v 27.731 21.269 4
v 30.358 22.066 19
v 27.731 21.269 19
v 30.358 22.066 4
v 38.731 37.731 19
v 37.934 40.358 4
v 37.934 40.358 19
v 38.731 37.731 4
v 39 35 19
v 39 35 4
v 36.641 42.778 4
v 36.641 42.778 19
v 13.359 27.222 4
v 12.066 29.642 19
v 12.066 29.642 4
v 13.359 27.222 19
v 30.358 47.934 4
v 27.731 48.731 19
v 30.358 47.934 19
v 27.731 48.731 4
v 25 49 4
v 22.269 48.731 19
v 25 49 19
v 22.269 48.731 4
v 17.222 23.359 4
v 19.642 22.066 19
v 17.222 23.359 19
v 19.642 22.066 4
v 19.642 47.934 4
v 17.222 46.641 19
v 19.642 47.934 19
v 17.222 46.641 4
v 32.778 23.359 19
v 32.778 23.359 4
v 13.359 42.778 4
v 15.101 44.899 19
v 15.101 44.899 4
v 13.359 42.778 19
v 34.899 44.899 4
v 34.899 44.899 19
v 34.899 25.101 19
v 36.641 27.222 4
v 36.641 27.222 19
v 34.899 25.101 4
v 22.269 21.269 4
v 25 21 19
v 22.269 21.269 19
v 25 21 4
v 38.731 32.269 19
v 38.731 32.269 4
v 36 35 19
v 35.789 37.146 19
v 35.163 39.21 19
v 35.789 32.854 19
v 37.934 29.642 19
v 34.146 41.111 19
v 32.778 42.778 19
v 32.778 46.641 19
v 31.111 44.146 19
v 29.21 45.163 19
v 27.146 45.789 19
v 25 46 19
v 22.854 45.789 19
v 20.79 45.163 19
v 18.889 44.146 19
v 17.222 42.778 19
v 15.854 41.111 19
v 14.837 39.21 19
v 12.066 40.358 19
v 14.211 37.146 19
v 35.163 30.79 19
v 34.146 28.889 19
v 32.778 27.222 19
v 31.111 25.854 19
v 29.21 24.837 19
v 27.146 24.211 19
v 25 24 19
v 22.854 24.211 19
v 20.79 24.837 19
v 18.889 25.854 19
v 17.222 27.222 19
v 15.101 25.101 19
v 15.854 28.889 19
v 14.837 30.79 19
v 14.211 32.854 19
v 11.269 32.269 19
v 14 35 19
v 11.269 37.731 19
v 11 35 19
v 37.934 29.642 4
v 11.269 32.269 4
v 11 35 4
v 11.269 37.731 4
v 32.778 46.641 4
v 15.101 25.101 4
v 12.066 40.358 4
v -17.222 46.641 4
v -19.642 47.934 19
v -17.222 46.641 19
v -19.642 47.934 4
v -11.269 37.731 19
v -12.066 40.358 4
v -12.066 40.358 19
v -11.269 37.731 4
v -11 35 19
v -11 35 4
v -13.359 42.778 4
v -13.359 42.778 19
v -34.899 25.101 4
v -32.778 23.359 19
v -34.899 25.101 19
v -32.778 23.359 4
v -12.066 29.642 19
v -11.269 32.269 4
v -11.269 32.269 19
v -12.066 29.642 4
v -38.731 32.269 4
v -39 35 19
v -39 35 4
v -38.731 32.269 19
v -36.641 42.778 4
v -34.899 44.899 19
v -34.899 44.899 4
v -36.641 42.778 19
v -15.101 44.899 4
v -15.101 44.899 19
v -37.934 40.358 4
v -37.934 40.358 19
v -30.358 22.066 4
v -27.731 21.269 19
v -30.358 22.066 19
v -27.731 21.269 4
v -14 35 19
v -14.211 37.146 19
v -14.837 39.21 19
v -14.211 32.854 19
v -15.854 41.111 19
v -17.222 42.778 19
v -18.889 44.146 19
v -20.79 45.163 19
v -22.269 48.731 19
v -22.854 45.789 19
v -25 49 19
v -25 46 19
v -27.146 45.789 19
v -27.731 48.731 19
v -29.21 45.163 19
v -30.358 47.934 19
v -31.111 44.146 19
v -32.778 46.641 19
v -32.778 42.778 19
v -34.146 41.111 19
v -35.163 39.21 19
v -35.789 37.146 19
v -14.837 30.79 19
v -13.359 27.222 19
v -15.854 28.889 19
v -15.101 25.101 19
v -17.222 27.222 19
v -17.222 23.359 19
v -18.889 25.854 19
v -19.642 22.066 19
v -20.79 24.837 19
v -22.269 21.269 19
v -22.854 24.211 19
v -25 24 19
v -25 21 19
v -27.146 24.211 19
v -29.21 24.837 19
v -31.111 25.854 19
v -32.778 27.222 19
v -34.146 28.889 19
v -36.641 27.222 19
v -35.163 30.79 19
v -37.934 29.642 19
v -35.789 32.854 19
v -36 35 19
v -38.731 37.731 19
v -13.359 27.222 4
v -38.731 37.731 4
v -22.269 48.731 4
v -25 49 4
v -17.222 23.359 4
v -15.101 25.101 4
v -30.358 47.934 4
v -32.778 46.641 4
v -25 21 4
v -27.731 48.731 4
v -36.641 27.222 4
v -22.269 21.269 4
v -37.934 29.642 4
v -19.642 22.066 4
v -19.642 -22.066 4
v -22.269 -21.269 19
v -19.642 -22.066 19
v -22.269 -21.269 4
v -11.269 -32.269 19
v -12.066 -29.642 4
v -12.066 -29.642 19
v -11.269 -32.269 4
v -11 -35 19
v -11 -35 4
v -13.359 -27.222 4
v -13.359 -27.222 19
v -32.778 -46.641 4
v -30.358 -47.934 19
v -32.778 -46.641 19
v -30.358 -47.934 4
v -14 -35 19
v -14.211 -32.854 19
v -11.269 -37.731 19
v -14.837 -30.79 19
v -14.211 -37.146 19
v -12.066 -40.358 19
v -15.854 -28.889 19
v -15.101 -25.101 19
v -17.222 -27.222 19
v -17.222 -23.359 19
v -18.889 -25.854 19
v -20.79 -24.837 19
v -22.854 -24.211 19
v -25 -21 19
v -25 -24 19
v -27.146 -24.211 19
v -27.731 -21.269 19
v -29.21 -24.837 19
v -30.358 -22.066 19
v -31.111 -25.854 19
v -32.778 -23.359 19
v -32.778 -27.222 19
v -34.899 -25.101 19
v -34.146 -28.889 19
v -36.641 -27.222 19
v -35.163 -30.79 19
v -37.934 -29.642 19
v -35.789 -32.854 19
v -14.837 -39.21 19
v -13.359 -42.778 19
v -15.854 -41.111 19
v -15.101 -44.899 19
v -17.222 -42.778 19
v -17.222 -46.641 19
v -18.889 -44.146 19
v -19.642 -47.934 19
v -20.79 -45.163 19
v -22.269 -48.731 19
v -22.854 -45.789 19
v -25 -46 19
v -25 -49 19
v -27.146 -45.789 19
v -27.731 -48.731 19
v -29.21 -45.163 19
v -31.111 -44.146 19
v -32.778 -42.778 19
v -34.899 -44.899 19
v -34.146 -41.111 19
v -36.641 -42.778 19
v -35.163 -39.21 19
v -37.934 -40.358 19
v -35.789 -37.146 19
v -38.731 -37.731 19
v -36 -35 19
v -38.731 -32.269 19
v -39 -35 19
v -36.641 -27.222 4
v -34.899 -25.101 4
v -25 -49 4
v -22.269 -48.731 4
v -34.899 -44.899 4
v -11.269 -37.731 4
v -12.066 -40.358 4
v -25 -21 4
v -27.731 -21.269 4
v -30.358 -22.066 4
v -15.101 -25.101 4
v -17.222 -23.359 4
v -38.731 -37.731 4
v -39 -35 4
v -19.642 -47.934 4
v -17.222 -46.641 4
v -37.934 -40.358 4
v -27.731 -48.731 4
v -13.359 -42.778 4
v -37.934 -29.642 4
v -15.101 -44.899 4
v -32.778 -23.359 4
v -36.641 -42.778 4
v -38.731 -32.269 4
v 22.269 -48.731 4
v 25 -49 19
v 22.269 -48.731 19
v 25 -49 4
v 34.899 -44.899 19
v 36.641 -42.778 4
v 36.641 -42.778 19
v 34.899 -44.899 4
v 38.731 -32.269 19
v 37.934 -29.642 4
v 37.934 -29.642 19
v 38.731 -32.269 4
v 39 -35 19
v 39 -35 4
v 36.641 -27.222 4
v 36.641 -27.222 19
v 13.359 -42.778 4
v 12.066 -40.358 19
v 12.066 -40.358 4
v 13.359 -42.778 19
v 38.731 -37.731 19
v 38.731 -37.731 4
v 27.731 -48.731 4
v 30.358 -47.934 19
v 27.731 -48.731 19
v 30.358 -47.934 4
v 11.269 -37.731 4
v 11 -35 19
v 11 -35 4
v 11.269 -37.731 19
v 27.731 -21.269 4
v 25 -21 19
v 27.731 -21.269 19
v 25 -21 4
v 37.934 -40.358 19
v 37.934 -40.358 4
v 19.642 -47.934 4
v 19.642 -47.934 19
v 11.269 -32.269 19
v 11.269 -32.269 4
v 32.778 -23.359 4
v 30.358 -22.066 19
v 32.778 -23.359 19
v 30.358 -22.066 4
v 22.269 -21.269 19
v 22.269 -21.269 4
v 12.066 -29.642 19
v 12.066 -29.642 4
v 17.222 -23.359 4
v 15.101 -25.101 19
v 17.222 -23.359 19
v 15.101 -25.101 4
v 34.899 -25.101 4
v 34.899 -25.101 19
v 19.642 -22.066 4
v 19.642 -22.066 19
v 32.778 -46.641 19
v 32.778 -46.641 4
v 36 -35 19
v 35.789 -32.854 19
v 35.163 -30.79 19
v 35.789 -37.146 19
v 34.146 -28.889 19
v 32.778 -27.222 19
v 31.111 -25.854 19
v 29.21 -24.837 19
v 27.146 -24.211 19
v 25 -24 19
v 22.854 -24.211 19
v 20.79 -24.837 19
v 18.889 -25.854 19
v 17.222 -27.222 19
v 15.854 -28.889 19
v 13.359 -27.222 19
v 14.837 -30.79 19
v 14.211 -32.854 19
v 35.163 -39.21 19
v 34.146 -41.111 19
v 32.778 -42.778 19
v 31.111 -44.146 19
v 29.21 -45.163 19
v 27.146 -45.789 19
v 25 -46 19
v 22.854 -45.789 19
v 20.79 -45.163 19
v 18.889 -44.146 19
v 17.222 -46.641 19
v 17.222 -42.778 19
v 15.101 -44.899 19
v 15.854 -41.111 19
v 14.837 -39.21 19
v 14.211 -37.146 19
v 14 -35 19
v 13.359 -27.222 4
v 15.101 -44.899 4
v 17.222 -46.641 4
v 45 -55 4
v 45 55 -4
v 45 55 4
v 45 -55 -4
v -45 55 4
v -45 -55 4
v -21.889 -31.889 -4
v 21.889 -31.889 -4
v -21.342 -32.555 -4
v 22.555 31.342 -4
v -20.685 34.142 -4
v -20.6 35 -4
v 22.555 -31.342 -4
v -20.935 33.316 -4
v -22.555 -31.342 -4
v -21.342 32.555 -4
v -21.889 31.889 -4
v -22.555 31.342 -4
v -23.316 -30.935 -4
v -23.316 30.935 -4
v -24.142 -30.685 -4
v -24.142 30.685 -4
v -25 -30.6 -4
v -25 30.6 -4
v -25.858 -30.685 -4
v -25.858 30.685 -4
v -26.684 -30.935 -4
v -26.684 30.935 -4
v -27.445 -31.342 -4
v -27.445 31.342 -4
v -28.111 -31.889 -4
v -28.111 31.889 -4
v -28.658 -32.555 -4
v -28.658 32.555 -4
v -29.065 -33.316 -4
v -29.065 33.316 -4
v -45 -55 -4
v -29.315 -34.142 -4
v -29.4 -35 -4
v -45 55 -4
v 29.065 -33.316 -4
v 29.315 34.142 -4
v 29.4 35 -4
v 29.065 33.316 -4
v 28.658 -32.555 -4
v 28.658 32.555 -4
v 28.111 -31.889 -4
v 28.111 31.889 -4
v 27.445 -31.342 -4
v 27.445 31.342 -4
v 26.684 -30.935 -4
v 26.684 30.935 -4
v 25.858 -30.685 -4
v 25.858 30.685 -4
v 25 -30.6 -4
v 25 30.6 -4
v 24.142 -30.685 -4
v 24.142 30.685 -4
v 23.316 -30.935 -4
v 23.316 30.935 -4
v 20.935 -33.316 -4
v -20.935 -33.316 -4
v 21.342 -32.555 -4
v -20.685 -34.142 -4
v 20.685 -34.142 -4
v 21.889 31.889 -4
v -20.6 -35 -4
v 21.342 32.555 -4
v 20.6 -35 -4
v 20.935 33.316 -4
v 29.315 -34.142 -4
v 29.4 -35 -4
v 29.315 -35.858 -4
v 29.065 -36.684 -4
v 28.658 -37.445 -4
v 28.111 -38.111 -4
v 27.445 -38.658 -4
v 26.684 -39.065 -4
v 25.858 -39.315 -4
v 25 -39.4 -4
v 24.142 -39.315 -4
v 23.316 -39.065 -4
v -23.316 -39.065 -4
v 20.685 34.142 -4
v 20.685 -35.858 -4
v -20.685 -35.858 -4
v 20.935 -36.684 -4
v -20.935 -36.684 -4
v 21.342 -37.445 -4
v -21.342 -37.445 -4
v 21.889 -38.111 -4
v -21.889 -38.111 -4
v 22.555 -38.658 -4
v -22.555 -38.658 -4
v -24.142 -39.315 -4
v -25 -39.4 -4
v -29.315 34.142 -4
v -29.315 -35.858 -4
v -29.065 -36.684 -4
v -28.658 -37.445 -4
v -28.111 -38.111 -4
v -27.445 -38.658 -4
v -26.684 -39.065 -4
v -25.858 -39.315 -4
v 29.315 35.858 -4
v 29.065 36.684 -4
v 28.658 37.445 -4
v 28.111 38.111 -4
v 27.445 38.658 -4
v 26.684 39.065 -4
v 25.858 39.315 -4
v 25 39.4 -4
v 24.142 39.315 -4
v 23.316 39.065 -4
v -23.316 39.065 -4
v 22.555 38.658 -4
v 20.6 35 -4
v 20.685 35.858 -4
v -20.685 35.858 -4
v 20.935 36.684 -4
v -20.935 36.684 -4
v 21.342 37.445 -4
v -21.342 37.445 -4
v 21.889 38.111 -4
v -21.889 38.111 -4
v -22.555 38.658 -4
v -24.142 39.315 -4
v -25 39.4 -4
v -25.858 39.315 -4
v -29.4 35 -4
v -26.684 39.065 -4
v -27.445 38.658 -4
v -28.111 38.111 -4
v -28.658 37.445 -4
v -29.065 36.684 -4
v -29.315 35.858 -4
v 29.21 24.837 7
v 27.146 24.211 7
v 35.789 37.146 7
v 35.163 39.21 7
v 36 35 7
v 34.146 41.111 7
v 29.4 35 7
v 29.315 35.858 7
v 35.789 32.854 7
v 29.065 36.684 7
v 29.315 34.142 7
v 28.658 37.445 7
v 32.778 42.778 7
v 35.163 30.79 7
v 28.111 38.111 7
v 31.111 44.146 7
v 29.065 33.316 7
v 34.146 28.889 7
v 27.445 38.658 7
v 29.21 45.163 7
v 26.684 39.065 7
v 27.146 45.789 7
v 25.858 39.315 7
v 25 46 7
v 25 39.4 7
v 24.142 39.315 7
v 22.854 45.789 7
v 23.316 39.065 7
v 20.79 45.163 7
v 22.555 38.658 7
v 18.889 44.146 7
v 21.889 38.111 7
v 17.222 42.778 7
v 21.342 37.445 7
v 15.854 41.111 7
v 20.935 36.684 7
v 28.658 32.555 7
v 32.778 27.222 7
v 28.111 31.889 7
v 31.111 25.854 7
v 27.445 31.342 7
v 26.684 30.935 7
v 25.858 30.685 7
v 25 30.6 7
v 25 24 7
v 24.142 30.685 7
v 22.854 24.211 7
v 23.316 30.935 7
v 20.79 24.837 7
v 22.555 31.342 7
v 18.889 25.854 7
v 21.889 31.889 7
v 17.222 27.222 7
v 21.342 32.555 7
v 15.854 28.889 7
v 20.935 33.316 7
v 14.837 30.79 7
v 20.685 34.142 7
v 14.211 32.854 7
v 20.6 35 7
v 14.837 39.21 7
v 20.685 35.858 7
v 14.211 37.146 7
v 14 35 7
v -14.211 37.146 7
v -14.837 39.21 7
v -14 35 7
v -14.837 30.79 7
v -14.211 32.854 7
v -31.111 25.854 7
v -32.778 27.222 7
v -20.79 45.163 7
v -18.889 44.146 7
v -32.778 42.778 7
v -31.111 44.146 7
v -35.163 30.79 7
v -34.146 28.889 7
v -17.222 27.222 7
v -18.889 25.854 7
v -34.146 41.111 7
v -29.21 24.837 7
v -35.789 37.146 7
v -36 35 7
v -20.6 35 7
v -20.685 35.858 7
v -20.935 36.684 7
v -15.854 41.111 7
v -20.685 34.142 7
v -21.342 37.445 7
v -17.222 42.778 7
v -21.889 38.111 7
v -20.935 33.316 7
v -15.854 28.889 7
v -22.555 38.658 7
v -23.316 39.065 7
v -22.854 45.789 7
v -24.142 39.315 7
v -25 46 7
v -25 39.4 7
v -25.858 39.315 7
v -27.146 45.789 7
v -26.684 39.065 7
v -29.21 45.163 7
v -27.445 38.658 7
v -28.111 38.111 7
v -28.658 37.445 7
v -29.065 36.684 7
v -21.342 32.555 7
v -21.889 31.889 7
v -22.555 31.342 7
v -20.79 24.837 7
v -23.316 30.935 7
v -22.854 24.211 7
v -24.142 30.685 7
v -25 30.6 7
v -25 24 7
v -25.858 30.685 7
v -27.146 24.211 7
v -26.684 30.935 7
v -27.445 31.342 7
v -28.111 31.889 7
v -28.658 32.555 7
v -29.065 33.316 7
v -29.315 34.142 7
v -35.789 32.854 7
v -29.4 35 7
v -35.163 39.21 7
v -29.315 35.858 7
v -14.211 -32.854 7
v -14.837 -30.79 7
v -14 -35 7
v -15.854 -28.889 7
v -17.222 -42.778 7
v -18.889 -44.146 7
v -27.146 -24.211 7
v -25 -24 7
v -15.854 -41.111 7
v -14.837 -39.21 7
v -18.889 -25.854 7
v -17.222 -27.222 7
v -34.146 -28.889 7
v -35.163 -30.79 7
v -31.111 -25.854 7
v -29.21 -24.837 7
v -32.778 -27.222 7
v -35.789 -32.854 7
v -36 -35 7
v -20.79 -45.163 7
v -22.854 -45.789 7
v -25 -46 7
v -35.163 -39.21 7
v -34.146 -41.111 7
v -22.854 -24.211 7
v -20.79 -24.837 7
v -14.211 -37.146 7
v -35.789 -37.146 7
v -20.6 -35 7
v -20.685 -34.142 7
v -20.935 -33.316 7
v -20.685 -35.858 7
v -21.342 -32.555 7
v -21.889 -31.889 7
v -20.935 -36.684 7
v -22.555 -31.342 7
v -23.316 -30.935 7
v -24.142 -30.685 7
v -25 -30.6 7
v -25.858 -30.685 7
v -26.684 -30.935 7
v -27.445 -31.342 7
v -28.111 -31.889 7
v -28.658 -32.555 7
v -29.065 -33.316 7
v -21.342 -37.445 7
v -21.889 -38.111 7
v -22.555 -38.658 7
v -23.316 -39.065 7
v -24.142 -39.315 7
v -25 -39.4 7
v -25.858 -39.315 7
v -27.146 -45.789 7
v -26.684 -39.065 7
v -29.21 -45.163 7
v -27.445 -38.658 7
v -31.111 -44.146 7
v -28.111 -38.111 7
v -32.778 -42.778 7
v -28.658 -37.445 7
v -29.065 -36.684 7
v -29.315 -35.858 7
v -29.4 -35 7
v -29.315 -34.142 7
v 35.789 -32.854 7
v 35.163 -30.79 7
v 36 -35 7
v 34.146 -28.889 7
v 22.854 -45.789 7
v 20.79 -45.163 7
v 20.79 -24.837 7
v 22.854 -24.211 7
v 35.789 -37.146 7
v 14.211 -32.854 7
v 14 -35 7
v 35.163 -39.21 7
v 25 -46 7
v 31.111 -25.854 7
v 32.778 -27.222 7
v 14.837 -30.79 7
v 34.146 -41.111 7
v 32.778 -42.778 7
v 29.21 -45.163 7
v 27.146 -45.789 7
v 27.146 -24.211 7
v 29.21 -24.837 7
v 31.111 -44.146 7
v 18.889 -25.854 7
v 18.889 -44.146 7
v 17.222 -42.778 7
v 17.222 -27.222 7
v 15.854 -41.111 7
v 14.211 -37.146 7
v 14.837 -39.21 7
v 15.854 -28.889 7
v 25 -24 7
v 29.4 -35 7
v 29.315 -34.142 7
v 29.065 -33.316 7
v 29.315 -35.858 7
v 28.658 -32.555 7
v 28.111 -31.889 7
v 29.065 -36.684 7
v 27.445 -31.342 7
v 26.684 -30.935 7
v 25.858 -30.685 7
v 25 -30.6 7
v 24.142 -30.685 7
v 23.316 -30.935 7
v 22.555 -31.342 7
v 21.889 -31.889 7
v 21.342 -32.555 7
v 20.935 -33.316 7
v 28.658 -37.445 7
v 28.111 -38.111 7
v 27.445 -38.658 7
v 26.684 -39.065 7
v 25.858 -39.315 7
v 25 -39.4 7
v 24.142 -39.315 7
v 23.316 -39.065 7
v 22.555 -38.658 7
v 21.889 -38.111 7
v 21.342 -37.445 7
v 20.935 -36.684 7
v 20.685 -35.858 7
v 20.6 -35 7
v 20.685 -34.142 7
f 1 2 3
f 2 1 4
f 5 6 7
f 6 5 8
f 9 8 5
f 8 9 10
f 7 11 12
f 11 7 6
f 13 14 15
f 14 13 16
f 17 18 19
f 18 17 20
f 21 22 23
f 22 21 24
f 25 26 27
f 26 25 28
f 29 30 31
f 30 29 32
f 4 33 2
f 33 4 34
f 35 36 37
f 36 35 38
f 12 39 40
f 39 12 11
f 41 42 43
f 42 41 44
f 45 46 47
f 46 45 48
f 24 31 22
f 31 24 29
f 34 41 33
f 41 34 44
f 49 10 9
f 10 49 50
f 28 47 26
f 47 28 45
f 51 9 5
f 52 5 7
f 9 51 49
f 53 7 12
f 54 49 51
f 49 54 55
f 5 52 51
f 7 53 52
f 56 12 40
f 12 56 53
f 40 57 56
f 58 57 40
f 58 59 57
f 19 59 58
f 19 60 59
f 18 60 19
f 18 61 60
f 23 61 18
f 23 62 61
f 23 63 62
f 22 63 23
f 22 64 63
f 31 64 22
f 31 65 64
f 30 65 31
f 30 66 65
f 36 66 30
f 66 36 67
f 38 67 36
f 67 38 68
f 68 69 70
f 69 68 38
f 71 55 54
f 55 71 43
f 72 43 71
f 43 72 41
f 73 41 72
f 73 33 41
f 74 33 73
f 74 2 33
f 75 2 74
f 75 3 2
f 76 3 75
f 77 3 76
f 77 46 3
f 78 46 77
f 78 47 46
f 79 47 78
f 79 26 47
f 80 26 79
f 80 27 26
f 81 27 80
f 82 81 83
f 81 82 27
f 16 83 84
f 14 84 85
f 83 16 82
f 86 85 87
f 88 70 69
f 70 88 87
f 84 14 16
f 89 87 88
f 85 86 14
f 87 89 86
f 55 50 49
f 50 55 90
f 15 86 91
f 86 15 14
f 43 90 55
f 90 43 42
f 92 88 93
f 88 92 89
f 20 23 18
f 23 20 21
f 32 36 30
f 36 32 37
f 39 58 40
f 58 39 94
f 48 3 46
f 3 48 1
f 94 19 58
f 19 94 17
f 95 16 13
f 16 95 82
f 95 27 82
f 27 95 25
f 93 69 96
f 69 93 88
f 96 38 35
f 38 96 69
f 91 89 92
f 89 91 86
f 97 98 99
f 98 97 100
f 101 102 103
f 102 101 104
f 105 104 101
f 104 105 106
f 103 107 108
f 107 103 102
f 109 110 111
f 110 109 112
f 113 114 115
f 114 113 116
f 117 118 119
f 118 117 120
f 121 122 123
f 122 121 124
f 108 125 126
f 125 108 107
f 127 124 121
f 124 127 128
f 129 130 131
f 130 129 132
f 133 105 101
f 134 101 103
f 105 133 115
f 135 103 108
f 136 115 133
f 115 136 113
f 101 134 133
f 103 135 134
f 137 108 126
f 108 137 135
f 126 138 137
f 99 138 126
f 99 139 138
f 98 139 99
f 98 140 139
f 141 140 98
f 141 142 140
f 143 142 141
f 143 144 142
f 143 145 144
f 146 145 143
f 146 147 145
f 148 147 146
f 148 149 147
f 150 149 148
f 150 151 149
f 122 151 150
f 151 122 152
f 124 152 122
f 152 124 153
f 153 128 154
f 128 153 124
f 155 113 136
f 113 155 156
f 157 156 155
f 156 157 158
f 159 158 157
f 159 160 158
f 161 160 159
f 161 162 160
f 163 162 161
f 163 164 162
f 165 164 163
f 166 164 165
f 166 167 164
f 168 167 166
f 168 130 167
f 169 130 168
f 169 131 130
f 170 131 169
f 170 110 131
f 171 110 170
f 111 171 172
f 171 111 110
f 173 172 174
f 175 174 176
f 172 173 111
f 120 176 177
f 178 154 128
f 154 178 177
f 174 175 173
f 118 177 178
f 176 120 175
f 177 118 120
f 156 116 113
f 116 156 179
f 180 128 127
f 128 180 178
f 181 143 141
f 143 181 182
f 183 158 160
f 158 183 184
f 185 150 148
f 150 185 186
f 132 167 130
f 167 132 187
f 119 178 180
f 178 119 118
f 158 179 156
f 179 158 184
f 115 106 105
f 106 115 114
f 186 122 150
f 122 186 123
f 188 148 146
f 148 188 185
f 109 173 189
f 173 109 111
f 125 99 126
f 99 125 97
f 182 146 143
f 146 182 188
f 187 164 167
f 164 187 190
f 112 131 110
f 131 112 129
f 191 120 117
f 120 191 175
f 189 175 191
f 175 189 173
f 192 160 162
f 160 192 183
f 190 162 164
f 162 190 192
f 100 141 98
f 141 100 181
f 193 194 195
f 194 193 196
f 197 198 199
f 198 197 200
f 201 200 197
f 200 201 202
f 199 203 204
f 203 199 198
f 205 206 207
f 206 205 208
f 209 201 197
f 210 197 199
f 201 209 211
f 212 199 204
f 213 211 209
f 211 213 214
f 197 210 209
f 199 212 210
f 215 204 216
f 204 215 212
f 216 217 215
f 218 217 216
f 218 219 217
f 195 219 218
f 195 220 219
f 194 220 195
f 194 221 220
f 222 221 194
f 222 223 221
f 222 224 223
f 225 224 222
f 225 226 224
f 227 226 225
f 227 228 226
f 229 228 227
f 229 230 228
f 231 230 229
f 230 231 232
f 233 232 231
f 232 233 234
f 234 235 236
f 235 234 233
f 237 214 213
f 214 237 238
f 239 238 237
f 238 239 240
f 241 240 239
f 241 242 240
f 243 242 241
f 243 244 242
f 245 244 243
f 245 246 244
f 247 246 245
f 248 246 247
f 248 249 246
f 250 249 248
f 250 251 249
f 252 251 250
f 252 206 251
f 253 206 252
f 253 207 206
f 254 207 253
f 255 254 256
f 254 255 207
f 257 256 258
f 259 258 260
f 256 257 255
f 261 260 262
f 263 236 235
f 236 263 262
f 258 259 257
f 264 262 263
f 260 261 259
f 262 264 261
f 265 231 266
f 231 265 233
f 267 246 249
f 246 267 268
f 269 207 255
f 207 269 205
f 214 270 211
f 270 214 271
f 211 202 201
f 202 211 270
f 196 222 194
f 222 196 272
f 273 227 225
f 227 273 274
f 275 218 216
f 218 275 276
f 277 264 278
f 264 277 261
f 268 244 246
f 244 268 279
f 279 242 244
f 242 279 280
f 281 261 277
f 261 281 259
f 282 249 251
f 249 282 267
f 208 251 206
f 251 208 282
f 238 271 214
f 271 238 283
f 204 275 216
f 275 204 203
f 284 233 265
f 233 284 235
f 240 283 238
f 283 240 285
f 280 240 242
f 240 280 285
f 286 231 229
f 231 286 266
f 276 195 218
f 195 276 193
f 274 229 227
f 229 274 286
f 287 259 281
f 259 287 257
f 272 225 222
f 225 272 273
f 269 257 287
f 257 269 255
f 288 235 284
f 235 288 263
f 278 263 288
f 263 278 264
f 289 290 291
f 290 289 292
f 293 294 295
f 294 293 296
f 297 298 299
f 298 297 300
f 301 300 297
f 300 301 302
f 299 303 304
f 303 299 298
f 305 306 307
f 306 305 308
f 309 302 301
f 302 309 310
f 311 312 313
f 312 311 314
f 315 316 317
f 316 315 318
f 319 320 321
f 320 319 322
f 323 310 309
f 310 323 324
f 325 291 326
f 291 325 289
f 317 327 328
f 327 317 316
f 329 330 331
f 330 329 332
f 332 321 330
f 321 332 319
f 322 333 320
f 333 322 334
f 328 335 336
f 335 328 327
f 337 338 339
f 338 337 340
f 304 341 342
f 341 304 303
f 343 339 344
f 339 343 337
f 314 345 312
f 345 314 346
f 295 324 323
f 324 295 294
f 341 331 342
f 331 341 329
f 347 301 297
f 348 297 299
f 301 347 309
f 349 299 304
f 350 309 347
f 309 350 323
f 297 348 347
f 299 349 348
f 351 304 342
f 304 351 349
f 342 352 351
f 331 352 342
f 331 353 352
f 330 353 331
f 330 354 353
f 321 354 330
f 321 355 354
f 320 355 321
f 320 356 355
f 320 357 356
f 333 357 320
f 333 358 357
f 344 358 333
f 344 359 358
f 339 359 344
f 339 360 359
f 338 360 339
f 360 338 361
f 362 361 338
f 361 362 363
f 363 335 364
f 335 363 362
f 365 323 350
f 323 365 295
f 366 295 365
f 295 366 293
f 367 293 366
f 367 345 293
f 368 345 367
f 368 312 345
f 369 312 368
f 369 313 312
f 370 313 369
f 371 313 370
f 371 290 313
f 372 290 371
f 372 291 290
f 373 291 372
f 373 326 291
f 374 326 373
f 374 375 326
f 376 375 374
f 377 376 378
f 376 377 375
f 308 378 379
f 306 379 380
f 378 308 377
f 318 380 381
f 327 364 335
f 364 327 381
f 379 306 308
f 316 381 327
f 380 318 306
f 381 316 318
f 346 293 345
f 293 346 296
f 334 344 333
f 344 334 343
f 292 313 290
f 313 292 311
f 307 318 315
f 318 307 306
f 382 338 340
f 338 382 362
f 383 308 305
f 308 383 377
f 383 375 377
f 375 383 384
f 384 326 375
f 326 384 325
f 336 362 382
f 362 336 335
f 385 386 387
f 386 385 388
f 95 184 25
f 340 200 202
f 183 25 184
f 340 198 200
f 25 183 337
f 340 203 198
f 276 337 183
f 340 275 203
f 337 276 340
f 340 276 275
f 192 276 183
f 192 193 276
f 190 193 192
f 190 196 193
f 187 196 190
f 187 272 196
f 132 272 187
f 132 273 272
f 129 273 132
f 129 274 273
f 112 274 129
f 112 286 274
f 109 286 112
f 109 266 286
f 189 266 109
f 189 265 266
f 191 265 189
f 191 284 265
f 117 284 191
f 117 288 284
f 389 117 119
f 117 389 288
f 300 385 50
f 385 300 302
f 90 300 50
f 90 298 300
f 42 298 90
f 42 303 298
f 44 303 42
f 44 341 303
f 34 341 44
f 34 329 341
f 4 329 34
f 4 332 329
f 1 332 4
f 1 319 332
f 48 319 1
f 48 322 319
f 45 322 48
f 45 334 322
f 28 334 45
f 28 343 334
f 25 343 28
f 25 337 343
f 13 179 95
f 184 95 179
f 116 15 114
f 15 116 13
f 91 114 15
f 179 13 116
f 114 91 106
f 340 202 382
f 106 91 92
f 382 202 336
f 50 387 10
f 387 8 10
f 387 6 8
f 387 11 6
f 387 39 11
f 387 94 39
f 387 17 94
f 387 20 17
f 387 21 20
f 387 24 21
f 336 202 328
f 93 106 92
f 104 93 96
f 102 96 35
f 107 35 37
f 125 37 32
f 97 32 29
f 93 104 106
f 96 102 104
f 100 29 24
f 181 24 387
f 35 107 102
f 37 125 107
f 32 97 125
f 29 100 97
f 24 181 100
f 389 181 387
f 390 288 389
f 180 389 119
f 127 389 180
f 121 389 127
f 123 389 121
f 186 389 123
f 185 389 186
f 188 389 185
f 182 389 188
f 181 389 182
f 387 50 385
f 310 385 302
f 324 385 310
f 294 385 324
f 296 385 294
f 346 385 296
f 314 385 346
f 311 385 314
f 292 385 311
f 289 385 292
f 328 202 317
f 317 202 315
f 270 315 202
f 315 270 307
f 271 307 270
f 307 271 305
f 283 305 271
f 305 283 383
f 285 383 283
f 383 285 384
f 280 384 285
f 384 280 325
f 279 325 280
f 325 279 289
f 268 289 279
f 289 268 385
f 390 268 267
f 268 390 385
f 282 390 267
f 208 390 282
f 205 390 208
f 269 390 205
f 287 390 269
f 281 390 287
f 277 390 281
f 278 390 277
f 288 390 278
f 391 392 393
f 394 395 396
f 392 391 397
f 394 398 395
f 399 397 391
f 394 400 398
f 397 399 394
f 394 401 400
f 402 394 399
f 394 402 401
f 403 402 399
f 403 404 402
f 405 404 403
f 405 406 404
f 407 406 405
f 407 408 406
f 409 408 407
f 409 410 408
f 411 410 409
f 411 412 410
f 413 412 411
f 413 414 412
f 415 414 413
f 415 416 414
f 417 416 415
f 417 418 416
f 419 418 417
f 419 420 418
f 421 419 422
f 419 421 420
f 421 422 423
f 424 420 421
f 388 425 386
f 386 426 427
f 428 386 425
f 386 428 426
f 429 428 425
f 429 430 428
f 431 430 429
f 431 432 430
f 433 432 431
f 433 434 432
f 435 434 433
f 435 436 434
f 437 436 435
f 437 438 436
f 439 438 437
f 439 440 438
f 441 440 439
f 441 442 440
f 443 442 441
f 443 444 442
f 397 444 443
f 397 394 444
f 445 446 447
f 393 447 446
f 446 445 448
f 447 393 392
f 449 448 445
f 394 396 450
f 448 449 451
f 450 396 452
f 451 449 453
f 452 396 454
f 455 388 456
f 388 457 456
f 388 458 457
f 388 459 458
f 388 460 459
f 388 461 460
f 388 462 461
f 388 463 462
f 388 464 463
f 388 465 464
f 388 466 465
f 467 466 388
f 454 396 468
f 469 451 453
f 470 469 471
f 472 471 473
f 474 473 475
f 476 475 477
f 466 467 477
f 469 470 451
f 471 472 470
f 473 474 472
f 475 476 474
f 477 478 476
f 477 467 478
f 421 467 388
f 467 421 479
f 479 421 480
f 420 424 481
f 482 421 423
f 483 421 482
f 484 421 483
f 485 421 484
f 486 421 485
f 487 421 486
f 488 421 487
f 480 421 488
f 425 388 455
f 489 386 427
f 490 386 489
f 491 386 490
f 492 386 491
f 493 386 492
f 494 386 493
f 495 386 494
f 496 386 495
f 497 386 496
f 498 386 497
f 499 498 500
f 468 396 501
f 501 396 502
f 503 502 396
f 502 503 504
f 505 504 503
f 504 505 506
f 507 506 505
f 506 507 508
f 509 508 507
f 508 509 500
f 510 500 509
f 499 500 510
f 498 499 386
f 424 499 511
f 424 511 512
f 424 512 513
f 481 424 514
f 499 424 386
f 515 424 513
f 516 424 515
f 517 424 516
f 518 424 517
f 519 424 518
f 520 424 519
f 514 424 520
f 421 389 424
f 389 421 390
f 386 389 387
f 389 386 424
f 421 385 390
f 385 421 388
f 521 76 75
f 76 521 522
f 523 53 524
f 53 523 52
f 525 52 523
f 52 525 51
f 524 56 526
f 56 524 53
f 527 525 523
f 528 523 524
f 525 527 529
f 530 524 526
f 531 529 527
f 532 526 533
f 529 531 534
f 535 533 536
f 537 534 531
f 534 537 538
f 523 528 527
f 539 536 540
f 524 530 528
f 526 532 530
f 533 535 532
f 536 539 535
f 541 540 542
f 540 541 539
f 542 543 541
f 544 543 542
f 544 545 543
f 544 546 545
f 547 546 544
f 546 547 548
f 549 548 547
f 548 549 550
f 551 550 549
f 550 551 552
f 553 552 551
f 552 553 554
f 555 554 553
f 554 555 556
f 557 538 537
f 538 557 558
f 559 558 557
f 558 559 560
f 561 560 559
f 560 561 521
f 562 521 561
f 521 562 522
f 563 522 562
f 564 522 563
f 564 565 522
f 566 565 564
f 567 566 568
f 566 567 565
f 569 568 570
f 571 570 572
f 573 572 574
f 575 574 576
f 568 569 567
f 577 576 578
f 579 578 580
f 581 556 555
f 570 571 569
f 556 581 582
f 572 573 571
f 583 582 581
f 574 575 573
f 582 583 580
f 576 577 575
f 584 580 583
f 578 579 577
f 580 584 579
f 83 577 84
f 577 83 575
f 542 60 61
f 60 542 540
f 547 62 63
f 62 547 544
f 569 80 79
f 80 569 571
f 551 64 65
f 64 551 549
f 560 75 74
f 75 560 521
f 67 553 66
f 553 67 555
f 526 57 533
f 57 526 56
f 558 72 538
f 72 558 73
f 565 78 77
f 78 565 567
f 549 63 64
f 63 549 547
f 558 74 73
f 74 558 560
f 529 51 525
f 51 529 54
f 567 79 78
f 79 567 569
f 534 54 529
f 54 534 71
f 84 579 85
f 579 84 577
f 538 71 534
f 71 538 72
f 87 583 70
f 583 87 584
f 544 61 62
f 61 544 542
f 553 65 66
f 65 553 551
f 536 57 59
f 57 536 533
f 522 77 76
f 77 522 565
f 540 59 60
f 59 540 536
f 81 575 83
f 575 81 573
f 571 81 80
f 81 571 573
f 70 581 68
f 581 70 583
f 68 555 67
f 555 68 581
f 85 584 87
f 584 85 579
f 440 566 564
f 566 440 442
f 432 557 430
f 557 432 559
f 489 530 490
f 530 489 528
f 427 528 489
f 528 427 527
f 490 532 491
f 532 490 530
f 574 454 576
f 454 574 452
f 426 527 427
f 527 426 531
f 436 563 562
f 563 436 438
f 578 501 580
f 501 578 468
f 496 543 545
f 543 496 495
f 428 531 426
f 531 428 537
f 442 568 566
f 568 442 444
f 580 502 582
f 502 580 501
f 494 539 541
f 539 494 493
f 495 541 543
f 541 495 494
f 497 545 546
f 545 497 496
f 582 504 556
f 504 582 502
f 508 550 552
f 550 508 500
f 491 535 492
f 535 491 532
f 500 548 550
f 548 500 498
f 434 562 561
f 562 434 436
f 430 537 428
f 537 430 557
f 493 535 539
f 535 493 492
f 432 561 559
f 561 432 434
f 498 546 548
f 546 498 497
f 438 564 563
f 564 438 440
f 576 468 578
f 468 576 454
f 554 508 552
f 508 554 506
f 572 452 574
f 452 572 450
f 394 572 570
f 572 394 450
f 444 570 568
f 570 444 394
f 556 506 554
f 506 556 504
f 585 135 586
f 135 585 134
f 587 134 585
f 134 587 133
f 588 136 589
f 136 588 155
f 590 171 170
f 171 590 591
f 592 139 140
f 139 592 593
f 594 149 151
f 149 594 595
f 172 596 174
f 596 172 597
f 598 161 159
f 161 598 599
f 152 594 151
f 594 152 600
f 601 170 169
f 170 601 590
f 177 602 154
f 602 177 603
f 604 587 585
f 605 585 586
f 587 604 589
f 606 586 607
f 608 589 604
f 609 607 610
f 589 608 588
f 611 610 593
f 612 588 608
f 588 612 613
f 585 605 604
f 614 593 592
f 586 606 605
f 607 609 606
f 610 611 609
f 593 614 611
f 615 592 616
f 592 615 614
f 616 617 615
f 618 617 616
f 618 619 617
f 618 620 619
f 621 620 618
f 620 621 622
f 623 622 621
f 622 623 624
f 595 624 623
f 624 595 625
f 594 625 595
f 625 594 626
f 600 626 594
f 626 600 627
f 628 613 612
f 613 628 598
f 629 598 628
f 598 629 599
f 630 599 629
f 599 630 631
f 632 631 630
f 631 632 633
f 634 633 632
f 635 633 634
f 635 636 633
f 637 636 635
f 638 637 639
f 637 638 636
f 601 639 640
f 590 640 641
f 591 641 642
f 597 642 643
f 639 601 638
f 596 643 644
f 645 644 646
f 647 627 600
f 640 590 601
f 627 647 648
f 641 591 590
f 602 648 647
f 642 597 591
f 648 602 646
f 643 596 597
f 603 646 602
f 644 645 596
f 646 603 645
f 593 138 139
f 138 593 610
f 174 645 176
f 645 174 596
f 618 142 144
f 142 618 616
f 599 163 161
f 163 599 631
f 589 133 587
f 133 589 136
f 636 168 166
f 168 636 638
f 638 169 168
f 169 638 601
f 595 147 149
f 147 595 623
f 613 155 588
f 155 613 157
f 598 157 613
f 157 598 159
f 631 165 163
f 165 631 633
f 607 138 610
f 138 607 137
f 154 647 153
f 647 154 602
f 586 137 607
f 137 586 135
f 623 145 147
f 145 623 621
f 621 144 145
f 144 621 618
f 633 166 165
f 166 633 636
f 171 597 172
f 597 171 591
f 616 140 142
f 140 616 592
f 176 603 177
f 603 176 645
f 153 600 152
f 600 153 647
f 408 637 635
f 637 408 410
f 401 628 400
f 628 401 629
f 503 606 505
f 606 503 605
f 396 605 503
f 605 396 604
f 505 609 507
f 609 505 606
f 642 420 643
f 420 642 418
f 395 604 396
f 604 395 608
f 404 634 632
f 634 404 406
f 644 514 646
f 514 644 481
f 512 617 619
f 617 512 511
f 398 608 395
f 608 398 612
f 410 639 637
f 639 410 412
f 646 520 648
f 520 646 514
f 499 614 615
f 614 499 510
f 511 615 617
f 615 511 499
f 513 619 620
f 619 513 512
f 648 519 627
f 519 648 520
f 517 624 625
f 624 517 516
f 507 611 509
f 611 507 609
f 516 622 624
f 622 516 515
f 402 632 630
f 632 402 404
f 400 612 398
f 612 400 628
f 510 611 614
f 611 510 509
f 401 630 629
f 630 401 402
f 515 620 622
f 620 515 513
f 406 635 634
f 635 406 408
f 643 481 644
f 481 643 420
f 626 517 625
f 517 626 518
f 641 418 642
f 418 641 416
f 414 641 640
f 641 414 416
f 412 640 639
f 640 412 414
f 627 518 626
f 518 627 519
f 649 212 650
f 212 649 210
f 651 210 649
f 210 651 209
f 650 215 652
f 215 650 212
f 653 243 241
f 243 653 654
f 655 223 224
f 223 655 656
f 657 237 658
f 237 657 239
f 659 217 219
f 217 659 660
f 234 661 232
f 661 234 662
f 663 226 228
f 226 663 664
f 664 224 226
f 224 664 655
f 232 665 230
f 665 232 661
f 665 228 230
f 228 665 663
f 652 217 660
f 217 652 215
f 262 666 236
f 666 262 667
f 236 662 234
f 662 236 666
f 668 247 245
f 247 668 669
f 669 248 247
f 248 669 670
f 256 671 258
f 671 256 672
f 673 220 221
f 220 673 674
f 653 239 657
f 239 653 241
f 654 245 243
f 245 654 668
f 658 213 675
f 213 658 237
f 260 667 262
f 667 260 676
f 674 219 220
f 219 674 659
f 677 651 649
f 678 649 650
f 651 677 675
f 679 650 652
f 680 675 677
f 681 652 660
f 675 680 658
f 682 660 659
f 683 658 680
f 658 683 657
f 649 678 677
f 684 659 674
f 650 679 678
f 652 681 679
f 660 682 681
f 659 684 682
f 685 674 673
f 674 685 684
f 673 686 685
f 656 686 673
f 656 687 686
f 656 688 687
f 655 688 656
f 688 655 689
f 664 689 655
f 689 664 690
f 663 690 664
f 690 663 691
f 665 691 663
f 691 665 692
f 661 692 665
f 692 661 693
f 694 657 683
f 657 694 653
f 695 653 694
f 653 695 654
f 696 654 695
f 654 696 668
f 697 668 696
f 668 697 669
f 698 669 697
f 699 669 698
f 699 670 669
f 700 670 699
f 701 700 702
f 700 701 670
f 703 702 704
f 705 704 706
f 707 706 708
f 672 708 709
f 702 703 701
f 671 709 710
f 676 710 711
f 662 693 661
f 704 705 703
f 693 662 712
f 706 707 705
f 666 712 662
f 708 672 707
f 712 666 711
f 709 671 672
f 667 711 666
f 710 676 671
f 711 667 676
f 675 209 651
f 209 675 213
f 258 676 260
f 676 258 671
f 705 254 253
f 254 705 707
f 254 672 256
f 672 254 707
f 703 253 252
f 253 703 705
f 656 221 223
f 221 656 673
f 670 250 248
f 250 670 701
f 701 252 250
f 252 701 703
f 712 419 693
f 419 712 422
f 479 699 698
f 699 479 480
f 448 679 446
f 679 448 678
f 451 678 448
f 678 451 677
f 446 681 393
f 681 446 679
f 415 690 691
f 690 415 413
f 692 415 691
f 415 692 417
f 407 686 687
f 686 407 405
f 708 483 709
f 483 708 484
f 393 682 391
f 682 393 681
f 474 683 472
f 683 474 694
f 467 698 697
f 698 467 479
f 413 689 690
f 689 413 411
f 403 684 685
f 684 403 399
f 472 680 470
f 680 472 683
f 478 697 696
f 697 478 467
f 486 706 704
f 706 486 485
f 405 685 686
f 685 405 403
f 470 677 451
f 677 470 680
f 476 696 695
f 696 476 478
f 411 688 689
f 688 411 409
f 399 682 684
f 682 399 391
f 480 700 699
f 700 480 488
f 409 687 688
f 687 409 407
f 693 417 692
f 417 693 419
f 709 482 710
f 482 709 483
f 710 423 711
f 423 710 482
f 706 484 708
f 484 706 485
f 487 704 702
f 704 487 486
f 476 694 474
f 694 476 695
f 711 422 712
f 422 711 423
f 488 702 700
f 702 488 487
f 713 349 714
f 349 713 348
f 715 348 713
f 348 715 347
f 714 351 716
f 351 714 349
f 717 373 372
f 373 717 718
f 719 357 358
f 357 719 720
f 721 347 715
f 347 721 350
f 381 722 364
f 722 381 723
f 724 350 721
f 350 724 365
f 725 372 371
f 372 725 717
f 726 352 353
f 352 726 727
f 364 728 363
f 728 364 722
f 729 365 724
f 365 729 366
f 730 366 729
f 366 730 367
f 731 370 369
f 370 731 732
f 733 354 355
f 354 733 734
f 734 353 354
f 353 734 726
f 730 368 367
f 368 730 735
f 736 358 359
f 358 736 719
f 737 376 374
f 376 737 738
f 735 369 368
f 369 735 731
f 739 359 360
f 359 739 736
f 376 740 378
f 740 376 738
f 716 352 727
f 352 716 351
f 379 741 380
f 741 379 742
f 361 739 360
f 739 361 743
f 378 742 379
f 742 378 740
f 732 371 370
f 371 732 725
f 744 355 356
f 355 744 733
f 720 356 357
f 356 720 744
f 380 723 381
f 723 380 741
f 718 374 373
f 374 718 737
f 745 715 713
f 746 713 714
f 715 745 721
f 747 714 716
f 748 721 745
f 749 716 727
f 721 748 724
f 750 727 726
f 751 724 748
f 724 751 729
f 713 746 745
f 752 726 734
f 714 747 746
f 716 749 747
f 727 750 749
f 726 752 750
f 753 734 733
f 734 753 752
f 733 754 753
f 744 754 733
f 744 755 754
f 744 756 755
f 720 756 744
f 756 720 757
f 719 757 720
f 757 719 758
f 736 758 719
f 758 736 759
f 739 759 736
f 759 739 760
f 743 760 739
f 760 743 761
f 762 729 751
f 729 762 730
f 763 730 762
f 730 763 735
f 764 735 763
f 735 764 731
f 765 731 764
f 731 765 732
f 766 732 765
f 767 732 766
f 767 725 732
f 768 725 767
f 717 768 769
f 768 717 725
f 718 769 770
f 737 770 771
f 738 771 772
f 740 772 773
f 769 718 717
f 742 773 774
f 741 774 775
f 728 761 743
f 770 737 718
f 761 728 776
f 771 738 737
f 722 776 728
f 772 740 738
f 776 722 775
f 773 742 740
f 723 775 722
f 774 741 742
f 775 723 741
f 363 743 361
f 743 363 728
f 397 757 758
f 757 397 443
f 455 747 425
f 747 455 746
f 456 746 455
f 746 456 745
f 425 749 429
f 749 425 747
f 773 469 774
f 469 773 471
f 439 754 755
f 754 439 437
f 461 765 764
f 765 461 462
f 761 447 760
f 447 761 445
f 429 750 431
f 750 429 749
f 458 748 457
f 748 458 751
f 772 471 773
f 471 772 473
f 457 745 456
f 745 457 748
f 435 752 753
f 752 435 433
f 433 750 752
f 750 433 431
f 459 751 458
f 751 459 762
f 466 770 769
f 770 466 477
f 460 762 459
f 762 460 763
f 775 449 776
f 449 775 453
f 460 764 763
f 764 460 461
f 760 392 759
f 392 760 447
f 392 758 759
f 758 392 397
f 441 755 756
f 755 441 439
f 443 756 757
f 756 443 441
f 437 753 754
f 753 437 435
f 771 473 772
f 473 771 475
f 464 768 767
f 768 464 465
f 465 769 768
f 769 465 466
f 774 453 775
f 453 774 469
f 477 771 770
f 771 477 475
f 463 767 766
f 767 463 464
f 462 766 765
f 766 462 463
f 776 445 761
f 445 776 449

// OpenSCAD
$fn = 32;

// ----------------------------------------------------------------------
// Socket pad plate
// bosses with counterbored sockets for the screws
// ----------------------------------------------------------------------

// --- parameters (mm) ---
base_t = 8;            // base plate thickness
boss_h = 15;           // boss height above the base plate
boss_d = 28;           // boss diameter
socket_d = 22;         // socket diameter
socket_depth = 12;     // socket depth from the boss face
bolt_d = 8.8;          // screw clearance hole through the socket floor
plate = [90, 110, 8];  // overall size (x, y, z)
edge = 20;             // boss centre offset from the plate edge
pads = 4;              // boss count, one per corner

// --- derived feature positions (mm) ---
height = base_t + boss_h;        // = 23   overall height of the part
corner_x = plate[0] / 2 - edge;  // = 25   boss centre X
corner_y = plate[1] / 2 - edge;  // = 35   boss centre Y
feature_centers = [
  [corner_x, corner_y],
  [-corner_x, corner_y],
  [-corner_x, -corner_y],
  [corner_x, -corner_y]
];   // boss centres: sockets, holes and the pads themselves are placed from here

// base plate, bosses on feature_centers, socket + through hole in each
difference() {
  union() {
    cube(plate, center = true);
    for (centre = feature_centers)
      translate([centre[0], centre[1], plate[2] / 2 - 1])
        cylinder(d = boss_d, h = boss_h + 1);
  }
  for (centre = feature_centers) {
    translate([centre[0], centre[1], plate[2] / 2 + boss_h - socket_depth])
      cylinder(d = socket_d, h = socket_depth + 1);
    translate([centre[0], centre[1], -height])
      cylinder(d = bolt_d, h = 2 * height + 2);  // through the socket floor
  }
}
